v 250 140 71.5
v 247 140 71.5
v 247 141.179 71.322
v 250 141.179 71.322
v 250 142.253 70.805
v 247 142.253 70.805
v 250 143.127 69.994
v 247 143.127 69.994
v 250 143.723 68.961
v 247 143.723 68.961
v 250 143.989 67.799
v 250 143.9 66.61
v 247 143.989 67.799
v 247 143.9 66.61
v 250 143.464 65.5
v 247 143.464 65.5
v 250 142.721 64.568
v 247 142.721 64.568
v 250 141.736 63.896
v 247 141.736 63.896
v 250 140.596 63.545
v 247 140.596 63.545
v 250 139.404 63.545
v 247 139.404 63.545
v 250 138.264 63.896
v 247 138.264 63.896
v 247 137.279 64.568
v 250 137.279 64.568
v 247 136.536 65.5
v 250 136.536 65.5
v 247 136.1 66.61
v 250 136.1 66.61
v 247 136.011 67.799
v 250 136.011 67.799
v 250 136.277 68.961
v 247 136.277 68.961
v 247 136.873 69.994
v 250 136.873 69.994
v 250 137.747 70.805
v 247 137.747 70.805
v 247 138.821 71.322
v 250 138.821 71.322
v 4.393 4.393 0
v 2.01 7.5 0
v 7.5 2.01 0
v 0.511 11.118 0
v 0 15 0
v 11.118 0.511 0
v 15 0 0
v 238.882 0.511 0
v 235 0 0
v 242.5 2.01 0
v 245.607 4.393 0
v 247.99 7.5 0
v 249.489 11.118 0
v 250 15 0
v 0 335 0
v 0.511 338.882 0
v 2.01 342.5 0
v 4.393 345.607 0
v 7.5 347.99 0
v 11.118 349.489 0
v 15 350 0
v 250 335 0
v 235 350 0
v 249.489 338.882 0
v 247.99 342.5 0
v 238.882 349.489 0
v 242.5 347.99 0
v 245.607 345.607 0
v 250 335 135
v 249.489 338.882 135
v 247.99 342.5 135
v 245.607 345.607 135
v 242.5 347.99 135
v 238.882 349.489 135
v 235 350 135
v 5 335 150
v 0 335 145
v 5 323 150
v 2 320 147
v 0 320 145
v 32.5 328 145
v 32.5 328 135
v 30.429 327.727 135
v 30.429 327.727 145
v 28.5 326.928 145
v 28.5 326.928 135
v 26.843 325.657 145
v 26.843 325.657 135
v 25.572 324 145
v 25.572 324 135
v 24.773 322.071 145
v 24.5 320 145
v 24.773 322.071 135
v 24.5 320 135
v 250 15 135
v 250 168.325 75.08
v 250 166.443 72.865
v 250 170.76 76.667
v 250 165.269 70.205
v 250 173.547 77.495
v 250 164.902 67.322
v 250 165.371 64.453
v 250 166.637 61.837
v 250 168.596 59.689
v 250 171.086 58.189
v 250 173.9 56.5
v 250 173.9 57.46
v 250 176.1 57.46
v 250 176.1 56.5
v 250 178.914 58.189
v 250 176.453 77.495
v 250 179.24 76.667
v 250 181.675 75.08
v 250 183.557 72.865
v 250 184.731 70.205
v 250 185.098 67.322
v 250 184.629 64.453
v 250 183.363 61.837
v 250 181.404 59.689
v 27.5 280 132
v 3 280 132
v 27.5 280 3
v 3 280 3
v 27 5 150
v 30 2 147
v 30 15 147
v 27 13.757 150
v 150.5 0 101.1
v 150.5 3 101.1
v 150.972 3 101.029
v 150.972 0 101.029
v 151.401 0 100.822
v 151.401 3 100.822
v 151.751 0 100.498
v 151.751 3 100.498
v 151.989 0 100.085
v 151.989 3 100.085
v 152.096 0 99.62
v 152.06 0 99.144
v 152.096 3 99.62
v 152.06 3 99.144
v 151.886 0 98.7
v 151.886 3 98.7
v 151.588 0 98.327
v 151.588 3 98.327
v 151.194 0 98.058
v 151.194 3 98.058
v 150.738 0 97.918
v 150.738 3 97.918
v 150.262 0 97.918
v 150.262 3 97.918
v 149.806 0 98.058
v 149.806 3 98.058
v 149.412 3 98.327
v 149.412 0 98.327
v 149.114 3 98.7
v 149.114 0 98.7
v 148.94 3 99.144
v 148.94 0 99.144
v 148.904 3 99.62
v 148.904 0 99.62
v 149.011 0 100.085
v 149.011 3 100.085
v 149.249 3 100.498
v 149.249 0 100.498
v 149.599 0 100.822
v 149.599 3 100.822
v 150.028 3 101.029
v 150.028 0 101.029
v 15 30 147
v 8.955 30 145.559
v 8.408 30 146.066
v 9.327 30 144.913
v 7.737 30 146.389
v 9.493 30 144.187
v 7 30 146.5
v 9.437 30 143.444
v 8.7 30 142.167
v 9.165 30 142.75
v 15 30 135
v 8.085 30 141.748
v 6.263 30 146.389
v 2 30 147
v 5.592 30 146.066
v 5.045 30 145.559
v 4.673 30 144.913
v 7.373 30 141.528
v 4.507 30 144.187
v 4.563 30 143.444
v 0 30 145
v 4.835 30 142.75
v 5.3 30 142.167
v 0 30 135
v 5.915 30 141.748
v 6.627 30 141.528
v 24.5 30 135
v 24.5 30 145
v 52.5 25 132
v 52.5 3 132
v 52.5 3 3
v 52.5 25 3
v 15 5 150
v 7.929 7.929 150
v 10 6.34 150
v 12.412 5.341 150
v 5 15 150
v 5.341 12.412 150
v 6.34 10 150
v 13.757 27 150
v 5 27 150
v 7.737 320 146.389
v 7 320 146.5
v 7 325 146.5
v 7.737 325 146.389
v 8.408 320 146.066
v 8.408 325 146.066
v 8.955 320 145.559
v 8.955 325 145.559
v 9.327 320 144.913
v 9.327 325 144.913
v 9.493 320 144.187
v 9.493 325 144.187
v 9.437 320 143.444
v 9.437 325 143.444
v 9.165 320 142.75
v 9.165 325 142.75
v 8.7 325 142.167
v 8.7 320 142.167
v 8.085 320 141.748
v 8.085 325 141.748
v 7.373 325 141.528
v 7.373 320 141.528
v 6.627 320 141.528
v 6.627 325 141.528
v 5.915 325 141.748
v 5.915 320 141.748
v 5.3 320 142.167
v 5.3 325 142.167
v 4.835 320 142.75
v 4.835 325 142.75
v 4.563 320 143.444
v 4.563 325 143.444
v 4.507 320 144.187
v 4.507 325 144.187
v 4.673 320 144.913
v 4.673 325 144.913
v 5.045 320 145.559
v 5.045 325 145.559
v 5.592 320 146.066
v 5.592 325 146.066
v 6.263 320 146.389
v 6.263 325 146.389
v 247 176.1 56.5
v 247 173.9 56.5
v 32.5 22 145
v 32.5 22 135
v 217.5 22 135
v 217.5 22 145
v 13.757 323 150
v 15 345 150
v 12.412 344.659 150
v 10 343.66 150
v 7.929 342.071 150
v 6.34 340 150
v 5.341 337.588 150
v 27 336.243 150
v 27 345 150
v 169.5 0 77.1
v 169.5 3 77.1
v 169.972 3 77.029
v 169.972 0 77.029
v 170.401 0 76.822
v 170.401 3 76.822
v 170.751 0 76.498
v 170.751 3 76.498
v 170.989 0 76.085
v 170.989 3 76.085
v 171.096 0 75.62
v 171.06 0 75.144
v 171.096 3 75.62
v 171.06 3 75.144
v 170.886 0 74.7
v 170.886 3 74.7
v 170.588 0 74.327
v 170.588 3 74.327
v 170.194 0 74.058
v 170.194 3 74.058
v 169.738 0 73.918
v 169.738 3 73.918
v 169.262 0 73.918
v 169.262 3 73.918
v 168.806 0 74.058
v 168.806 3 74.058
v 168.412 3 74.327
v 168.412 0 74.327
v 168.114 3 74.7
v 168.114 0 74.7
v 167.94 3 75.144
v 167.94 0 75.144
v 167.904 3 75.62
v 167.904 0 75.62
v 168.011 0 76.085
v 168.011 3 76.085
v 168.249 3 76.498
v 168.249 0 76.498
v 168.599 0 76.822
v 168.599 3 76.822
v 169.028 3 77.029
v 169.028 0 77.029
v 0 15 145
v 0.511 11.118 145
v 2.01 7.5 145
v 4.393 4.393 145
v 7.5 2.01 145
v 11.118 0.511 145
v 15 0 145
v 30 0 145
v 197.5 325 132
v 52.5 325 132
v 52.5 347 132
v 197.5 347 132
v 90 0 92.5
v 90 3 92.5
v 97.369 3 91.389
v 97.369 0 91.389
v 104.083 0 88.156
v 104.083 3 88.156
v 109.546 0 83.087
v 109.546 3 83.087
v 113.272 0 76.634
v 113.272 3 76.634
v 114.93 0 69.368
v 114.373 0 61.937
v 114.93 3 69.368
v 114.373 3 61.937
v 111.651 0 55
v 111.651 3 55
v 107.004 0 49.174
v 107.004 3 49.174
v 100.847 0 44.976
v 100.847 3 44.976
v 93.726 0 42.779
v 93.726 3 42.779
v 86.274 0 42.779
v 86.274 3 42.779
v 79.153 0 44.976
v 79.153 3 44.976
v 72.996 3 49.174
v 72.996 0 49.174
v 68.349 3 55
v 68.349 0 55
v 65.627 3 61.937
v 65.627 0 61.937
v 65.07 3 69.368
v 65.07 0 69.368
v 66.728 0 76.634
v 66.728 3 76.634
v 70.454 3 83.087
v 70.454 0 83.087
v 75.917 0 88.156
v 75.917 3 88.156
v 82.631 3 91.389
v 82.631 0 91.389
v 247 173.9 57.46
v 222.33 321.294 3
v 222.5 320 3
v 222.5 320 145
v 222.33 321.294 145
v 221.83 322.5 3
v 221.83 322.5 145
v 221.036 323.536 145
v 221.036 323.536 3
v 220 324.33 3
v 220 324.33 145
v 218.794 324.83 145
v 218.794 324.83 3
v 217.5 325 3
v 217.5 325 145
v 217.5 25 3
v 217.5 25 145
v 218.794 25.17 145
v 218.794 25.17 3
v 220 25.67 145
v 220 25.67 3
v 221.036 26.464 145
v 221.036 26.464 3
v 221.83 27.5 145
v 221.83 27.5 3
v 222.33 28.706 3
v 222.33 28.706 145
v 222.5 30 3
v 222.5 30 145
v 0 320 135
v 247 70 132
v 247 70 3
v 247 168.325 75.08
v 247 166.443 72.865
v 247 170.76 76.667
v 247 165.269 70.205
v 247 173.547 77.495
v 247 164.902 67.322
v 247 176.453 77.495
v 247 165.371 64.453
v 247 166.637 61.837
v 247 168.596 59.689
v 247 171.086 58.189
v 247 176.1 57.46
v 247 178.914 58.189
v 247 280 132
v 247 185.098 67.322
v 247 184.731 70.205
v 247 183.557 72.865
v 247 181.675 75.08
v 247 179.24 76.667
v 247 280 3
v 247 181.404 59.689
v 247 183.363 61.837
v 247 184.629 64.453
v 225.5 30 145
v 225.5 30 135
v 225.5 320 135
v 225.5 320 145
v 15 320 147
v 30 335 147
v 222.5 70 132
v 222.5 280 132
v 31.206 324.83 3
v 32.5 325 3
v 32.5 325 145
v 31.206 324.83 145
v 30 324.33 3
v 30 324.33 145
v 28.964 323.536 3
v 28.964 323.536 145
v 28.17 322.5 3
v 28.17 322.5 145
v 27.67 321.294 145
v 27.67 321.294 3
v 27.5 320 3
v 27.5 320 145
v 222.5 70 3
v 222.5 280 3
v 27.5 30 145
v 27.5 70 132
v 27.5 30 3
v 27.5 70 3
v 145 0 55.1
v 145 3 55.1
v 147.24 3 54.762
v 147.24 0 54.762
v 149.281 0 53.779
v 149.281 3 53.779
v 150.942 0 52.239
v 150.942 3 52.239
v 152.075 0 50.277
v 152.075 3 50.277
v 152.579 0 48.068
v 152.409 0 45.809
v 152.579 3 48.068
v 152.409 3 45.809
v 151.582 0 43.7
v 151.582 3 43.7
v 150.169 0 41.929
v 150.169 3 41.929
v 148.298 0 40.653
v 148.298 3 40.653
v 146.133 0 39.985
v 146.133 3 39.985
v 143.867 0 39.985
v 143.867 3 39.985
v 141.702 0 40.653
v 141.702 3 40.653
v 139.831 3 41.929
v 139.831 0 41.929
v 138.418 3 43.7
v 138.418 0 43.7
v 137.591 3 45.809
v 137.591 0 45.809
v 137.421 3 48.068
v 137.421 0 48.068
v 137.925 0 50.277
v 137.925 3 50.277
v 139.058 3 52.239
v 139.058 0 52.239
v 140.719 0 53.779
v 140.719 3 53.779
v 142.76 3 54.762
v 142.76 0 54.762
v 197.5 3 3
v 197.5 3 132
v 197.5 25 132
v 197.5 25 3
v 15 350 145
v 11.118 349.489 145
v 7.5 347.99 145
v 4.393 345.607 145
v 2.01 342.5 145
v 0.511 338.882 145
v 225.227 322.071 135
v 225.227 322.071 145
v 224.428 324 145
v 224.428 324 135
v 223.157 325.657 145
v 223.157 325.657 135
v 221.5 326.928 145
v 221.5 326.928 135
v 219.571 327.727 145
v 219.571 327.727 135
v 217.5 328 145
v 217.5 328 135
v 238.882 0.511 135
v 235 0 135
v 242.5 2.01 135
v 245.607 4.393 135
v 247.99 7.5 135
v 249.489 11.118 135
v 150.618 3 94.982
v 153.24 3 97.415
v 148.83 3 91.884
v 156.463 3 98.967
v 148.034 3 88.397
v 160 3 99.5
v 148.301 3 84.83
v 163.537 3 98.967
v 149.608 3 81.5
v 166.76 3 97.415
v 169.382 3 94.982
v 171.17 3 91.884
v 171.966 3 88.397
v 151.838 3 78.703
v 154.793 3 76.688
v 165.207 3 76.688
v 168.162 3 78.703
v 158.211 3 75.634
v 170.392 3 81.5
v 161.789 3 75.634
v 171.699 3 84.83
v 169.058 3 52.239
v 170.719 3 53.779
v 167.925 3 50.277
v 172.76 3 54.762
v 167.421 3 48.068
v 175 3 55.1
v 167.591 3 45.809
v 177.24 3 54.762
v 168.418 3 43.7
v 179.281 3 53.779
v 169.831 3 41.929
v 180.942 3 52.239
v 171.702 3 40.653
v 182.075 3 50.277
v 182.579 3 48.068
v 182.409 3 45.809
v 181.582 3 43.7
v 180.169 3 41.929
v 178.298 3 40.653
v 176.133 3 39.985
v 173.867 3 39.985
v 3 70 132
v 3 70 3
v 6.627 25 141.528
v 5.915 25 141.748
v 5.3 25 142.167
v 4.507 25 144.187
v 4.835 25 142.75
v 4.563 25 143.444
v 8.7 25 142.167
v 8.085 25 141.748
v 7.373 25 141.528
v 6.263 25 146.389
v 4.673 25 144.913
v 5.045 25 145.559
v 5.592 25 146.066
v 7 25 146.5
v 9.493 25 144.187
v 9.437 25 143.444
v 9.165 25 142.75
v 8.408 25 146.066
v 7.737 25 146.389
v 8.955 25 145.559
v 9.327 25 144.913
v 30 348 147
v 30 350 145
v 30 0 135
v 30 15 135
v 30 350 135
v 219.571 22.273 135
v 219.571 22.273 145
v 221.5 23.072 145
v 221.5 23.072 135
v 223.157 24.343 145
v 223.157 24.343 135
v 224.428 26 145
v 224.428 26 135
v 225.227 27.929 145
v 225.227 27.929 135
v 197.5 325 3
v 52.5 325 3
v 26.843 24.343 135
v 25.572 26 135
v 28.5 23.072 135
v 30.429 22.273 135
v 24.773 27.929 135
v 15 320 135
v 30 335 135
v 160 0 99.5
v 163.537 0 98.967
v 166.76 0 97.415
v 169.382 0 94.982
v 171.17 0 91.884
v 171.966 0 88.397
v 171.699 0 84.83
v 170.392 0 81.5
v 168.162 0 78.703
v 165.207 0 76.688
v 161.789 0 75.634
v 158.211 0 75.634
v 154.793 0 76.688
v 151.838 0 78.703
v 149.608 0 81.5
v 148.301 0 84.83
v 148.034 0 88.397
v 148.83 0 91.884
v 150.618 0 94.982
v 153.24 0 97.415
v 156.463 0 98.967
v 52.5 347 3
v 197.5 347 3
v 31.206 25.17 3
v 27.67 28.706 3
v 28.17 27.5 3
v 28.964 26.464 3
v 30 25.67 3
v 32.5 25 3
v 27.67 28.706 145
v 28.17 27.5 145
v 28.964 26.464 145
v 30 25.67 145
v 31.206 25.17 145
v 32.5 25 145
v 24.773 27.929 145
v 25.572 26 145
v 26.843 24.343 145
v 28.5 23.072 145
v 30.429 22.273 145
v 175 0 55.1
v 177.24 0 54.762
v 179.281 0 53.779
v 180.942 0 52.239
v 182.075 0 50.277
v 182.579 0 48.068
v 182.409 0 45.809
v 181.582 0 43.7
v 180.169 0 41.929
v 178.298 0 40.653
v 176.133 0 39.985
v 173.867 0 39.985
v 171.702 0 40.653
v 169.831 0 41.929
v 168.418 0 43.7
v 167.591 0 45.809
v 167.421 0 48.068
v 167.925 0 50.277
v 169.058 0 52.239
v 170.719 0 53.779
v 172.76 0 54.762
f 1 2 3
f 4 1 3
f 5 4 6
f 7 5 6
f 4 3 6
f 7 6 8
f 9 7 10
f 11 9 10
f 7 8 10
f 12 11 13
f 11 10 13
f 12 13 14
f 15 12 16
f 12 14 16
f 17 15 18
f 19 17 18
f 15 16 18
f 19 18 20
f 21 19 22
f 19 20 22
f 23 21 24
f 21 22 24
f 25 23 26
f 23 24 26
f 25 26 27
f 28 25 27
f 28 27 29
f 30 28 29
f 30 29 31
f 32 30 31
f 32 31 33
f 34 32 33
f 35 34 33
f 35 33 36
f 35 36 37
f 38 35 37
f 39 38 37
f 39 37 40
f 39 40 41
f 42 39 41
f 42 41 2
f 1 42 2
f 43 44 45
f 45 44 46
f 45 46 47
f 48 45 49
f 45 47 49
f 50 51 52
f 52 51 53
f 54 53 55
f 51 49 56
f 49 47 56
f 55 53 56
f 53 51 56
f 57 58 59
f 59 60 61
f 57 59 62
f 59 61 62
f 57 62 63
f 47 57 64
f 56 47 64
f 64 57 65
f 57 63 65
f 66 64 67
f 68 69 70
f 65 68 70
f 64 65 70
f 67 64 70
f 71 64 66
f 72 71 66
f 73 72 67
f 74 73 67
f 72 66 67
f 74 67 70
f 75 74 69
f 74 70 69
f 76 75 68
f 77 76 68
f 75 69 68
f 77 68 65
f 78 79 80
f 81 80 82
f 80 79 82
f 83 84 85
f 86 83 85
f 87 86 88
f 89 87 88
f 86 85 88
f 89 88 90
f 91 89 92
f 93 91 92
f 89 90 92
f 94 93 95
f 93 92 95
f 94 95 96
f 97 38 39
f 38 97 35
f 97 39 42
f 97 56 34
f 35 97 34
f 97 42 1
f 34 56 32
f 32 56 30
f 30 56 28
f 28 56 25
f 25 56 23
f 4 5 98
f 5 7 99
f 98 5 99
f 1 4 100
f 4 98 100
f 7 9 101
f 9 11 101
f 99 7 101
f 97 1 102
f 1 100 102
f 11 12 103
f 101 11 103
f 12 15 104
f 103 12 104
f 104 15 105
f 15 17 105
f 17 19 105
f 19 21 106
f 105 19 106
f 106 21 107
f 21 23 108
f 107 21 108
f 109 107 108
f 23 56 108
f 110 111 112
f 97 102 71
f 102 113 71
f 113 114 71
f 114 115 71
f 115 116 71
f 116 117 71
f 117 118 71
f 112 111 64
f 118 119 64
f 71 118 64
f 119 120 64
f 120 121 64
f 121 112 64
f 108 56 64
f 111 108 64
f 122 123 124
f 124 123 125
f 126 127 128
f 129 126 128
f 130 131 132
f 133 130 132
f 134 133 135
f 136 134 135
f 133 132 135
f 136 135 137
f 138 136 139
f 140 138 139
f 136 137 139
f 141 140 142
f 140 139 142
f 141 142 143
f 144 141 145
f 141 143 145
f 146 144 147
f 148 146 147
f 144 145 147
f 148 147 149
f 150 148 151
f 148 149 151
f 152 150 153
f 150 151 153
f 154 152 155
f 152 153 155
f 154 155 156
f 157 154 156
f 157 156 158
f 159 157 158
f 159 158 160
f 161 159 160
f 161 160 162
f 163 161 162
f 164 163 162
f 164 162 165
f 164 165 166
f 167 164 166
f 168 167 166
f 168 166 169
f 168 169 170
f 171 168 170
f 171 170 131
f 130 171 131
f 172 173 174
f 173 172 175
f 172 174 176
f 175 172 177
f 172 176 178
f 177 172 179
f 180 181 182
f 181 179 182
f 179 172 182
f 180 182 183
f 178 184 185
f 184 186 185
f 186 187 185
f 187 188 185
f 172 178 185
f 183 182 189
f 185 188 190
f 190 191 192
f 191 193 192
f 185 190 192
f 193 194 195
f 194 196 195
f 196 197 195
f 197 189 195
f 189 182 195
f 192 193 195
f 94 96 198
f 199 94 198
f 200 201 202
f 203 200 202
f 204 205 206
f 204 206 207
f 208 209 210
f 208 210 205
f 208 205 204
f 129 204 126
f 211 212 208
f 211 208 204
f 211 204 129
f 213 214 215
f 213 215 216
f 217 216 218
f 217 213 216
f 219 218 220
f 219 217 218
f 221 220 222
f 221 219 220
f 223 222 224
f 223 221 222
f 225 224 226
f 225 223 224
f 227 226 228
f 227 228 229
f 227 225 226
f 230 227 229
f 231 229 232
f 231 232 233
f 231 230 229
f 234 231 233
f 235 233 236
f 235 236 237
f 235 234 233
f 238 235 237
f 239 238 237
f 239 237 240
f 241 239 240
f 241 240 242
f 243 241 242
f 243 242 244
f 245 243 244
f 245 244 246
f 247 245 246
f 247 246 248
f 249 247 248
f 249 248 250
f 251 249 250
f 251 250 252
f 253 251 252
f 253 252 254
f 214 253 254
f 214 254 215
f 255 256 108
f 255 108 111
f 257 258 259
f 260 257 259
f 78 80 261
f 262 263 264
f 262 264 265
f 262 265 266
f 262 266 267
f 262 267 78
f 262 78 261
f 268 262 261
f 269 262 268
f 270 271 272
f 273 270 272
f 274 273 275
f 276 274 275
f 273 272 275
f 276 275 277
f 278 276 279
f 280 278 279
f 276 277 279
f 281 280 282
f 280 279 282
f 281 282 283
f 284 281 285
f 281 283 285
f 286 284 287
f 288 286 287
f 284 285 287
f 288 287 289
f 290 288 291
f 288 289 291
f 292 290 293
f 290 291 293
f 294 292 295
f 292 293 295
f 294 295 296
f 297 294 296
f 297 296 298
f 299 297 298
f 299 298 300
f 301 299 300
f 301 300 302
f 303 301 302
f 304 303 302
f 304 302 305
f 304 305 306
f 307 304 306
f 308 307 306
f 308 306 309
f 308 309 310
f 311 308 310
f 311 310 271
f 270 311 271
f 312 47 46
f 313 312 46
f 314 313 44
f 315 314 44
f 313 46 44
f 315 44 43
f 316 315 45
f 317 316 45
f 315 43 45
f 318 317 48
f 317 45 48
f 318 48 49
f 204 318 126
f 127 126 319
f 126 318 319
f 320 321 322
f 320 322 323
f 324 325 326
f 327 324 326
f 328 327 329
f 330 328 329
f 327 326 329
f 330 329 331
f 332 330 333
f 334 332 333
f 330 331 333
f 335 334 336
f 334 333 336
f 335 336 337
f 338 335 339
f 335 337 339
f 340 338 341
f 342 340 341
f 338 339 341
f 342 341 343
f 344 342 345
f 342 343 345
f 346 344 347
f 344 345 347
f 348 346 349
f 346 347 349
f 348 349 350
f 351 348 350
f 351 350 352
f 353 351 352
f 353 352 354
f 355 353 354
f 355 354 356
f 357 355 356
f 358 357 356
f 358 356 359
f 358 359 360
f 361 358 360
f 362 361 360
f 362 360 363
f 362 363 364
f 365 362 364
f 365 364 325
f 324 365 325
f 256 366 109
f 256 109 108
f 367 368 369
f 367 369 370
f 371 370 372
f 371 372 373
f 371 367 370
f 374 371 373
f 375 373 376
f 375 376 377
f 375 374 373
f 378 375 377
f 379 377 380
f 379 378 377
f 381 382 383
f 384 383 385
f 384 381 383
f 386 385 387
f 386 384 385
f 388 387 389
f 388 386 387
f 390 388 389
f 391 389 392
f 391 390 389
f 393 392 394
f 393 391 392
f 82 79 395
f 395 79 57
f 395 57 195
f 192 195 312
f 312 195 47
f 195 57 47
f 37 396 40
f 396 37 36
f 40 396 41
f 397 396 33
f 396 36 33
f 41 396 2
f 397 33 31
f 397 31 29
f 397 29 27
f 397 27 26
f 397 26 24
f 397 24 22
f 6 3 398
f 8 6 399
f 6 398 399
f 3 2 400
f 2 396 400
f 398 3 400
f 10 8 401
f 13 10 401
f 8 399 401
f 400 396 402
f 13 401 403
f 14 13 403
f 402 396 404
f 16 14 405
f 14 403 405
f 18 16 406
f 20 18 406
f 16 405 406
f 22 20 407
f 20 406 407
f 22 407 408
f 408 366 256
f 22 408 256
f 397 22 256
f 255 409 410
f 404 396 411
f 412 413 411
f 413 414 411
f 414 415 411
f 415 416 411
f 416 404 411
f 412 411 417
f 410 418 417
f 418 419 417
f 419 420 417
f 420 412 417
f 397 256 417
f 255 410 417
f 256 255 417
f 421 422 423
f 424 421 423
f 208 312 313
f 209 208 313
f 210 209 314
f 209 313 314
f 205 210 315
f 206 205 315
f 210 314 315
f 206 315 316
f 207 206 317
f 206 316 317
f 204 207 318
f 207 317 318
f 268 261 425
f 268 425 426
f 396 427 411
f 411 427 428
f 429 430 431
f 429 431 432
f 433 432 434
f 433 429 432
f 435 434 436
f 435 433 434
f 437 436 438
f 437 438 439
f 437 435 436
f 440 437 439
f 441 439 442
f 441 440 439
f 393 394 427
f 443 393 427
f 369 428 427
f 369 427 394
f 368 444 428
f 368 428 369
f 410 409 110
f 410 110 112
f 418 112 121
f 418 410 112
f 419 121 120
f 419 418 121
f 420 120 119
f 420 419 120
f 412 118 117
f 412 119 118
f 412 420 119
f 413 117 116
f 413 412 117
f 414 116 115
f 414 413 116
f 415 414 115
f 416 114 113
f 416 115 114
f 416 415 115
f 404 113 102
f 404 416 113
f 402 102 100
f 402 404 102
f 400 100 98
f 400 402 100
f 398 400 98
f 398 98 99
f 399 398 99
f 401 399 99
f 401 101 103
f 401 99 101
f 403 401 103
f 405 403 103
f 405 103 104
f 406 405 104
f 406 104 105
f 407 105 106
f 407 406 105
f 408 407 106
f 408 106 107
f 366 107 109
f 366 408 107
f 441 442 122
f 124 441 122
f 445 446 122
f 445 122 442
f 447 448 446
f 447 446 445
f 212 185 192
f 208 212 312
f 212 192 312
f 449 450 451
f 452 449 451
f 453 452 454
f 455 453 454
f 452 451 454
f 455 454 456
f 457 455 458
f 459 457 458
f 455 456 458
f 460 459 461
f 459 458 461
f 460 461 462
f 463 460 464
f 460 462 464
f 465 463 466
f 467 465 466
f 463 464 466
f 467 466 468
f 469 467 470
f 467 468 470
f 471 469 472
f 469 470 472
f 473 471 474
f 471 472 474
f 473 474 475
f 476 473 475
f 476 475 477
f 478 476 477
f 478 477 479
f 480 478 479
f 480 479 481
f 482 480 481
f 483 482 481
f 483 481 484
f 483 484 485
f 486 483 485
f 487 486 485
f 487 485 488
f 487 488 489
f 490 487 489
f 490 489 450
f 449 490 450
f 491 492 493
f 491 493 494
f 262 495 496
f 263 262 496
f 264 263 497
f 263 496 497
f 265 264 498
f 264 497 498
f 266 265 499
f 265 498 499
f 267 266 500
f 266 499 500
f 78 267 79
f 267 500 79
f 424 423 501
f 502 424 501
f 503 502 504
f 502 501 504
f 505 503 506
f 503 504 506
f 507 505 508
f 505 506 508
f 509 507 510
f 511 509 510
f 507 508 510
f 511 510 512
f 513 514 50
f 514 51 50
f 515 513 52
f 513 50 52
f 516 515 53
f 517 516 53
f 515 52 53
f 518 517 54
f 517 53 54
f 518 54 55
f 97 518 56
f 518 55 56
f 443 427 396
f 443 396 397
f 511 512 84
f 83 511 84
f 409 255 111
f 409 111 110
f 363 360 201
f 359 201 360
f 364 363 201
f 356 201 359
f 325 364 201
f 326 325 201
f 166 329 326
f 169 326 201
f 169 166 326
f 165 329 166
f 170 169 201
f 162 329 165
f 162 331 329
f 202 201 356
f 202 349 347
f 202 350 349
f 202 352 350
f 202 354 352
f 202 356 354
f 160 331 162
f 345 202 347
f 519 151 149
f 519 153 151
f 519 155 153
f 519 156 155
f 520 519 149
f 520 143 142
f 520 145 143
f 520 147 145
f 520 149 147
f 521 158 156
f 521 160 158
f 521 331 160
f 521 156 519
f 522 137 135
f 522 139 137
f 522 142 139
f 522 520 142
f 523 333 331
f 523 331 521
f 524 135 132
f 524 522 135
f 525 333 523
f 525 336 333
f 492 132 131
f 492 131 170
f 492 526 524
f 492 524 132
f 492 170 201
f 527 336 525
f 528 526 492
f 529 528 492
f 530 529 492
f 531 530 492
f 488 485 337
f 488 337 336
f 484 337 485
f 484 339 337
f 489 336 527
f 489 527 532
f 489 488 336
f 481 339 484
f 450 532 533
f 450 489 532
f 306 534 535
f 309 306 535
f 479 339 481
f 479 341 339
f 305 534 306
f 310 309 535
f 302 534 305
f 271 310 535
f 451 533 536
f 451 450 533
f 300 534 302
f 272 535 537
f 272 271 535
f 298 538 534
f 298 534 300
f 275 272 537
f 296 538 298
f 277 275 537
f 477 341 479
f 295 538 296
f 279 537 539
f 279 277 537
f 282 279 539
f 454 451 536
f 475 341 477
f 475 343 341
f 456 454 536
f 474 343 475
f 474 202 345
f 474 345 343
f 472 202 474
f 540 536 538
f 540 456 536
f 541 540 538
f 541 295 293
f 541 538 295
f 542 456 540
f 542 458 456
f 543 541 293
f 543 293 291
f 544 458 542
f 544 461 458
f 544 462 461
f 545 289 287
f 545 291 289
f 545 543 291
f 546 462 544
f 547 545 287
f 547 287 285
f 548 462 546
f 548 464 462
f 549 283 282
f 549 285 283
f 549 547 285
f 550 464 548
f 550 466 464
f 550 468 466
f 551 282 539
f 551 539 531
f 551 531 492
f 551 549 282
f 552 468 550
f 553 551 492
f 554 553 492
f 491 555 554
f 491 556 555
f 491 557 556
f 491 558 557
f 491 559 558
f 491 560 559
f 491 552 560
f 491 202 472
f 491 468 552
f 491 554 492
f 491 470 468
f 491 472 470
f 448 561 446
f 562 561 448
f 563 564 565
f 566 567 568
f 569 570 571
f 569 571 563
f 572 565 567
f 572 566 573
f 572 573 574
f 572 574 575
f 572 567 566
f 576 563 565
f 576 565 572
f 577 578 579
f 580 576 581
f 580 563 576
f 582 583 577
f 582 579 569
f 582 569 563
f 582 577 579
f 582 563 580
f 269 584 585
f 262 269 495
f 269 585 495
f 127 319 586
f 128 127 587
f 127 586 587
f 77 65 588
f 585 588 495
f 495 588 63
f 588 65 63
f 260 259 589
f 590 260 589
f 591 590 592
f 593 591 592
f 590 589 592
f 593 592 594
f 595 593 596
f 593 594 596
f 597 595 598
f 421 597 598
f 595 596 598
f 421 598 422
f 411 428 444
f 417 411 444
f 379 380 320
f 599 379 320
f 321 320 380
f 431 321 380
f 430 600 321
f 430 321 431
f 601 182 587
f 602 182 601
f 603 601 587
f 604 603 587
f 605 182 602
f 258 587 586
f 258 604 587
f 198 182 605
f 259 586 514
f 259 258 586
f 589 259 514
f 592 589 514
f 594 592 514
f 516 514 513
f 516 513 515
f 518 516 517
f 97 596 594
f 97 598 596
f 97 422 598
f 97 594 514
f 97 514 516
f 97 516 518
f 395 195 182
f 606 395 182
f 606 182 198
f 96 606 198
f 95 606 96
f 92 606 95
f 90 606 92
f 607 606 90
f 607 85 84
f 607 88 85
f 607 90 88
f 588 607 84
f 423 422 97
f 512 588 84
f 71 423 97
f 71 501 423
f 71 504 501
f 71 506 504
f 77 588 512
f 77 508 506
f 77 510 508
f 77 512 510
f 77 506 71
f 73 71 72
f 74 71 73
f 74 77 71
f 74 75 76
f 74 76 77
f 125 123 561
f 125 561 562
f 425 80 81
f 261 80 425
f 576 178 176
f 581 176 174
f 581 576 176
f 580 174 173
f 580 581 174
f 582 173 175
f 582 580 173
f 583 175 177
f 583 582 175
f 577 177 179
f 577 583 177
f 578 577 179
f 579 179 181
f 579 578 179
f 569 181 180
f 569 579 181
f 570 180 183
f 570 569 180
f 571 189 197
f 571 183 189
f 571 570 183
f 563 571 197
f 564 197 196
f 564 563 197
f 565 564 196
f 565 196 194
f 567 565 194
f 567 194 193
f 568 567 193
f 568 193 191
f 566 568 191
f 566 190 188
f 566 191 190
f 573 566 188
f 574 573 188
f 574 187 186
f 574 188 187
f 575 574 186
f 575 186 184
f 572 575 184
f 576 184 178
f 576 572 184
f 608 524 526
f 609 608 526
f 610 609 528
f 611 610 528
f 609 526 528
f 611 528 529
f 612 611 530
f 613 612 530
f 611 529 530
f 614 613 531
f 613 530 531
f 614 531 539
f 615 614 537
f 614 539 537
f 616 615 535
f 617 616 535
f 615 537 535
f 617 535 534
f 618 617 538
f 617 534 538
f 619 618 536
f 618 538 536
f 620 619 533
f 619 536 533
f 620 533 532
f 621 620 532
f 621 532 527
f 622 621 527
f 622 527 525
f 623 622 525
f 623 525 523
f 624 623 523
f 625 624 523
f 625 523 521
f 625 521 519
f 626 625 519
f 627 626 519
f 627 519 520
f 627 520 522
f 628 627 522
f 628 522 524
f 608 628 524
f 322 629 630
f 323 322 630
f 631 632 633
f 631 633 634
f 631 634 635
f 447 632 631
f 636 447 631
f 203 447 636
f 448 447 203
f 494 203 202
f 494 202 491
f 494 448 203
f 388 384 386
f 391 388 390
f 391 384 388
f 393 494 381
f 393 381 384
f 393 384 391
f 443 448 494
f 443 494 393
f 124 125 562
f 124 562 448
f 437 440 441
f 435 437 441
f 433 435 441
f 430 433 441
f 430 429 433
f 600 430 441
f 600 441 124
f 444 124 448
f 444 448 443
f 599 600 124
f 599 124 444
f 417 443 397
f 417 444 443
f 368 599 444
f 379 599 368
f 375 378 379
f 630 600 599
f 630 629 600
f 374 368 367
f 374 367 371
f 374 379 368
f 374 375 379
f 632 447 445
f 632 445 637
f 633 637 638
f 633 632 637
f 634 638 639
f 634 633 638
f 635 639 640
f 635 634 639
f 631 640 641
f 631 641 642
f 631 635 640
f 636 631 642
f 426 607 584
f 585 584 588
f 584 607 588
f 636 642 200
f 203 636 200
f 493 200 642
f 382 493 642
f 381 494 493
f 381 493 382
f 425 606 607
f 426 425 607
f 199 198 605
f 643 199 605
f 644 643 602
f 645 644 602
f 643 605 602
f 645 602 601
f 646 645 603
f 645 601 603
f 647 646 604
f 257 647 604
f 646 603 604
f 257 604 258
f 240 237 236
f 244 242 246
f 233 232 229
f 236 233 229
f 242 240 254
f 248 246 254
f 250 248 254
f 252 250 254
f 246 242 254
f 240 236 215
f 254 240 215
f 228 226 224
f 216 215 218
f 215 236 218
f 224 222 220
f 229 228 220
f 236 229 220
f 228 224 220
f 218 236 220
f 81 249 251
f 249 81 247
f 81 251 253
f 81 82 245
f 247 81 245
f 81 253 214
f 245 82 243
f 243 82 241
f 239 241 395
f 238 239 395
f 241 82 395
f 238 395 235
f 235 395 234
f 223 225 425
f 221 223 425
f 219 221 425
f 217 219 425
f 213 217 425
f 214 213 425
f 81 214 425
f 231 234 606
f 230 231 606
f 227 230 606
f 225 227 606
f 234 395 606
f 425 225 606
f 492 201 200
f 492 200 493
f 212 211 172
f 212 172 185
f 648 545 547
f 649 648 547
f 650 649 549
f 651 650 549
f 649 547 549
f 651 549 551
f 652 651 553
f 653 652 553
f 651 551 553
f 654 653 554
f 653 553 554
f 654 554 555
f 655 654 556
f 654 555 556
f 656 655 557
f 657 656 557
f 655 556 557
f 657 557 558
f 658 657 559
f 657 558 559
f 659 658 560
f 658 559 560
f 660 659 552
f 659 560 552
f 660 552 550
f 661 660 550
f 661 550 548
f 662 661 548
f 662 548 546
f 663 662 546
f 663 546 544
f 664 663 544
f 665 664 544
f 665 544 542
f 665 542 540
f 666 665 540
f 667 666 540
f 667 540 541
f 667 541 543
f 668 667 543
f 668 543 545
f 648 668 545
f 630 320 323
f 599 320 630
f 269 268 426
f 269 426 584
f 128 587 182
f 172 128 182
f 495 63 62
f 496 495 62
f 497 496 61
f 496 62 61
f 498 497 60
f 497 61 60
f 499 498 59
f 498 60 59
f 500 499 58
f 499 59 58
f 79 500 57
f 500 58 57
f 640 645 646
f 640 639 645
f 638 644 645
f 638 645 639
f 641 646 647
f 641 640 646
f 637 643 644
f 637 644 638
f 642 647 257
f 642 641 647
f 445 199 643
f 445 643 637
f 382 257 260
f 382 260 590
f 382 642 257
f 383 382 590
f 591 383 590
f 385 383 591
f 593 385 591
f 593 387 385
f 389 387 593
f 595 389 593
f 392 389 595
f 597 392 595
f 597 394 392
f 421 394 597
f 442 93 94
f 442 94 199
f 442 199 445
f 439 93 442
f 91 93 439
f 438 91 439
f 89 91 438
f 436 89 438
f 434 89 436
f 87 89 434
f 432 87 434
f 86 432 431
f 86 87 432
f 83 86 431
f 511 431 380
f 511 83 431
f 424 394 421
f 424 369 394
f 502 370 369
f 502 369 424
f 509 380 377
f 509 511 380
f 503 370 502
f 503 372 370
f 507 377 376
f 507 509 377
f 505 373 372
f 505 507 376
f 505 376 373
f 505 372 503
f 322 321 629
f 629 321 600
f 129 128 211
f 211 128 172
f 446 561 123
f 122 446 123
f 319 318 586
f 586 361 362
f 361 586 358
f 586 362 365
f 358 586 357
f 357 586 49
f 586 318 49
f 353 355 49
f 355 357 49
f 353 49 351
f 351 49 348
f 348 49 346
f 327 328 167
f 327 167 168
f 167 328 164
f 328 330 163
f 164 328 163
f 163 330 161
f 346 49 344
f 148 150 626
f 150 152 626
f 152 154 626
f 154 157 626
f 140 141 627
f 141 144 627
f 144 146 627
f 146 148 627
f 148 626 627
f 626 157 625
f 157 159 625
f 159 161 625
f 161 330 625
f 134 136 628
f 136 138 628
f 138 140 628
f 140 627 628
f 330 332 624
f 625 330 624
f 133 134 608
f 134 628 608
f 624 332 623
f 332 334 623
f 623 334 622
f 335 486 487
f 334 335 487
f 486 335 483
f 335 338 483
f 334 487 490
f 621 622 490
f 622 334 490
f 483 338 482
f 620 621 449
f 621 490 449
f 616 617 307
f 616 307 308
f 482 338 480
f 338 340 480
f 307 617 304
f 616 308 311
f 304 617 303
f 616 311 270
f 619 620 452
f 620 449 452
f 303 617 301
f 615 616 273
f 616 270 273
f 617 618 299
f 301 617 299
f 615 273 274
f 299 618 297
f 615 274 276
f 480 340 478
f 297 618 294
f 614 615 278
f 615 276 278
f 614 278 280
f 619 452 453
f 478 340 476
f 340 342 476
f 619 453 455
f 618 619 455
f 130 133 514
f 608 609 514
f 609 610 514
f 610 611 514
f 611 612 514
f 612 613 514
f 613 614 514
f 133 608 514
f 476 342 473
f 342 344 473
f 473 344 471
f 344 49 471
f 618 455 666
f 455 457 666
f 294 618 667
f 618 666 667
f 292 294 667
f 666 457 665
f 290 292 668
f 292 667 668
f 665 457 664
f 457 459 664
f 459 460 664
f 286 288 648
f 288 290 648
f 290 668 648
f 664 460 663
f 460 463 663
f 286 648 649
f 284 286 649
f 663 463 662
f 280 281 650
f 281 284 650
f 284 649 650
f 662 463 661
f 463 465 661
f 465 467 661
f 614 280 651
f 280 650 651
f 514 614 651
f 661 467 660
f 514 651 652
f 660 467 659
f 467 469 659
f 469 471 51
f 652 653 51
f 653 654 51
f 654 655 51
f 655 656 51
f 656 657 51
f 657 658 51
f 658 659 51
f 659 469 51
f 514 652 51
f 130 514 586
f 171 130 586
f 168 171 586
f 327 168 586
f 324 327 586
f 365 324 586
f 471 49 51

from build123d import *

# Parameters (mm, degrees)
BOSS_EXTRUDE1_DEPTH     = 3
BOSS_EXTRUDE2_DEPTH     = 132
CUT_EXTRUDE1_DEPTH      = 219.5
CUT_EXTRUDE1_DEPTH_BACK = 24.5
SKETCH3_W               = 129
SKETCH3_H               = 210
CUT_EXTRUDE2_DEPTH      = 322
CUT_EXTRUDE2_DEPTH_BACK = 22
SKETCH5_W               = 145
SKETCH5_H               = 129
BOSS_EXTRUDE3_DEPTH     = 10
BOSS_EXTRUDE4_DEPTH     = 15
CHAMFER1_SIZE           = 5
CHAMFER2_SIZE           = 3
CUT_EXTRUDE3_DEPTH      = 295
CUT_EXTRUDE3_DEPTH_BACK = 5
SKETCH10_R              = 2.5
SKETCH11_R              = 12
SKETCH11_R_2            = 7.6
SKETCH11_R_3            = 25
SKETCH11_R_4            = 1.6
CUT_EXTRUDE4_DEPTH      = 10
SKETCH13_R              = 4
CUT_EXTRUDE6_DEPTH      = 10


with BuildPart() as part:
    # Sketch1 → Boss-Extrude1 (new body)
    with BuildSketch(Plane.XY):
        with BuildLine():
            Line((15, 0), (235, 0))
            ThreePointArc((235, 0), (245.606601718, 4.393398282), (250, 15))
            Line((250, 15), (250, 335))
            ThreePointArc((250, 335), (245.606601718, 345.606601718), (235, 350))
            Line((235, 350), (15, 350))
            ThreePointArc((15, 350), (4.393398282, 345.606601718), (0, 335))
            Line((0, 335), (0, 15))
            ThreePointArc((0, 15), (4.393398282, 4.393398282), (15, 0))
        make_face()
    extrude(amount=BOSS_EXTRUDE1_DEPTH)

    # Sketch2 → Boss-Extrude2 (add)
    with BuildSketch(Plane.XY.offset(3)):
        with BuildLine():
            Line((0, 335), (0, 15))
            ThreePointArc((0, 15), (4.393398282, 4.393398282), (15, 0))
            Line((15, 0), (235, 0))
            ThreePointArc((235, 0), (245.606601718, 4.393398282), (250, 15))
            Line((250, 15), (250, 335))
            ThreePointArc((250, 335), (245.606601718, 345.606601718), (235, 350))
            Line((235, 350), (15, 350))
            ThreePointArc((15, 350), (4.393398282, 345.606601718), (0, 335))
        make_face()
        with BuildLine():
            ThreePointArc((32.5, 325), (28.964466094, 323.535533906), (27.5, 320))
            Line((27.5, 320), (27.5, 30))
            ThreePointArc((27.5, 30), (28.964466094, 26.464466094), (32.5, 25))
            Line((32.5, 25), (217.5, 25))
            ThreePointArc((217.5, 25), (221.035533906, 26.464466094), (222.5, 30))
            Line((222.5, 30), (222.5, 320))
            ThreePointArc((222.5, 320), (221.035533906, 323.535533906), (217.5, 325))
            Line((217.5, 325), (32.5, 325))
        make_face(mode=Mode.SUBTRACT)
    extrude(amount=BOSS_EXTRUDE2_DEPTH)

    # Sketch3 → Cut-Extrude1 (cut, two sides: drawn at the far end of the back side and taken through both)
    with BuildSketch(Plane(origin=(27.5, 0, 0), x_dir=(0, 0, -1), z_dir=(1, 0, 0)).offset(-CUT_EXTRUDE1_DEPTH_BACK)):
        with Locations((-67.5, 175)):
            Rectangle(SKETCH3_W, SKETCH3_H)
    extrude(amount=CUT_EXTRUDE1_DEPTH + CUT_EXTRUDE1_DEPTH_BACK, mode=Mode.SUBTRACT)

    # Sketch5 → Cut-Extrude2 (cut, two sides: drawn at the far end of the back side and taken through both)
    with BuildSketch(Plane(origin=(0, 25, 0), x_dir=(1, 0, 0), z_dir=(0, 1, 0)).offset(-CUT_EXTRUDE2_DEPTH_BACK)):
        with Locations((125, -67.5)):
            Rectangle(SKETCH5_W, SKETCH5_H)
    extrude(amount=CUT_EXTRUDE2_DEPTH + CUT_EXTRUDE2_DEPTH_BACK, mode=Mode.SUBTRACT)

    # Sketch8 → Boss-Extrude3 (add)
    with BuildSketch(Plane.XY.offset(135)):
        with BuildLine():
            Line((225.5, 30), (225.5, 320))
            ThreePointArc((225.5, 320), (223.156854249, 325.656854249), (217.5, 328))
            Line((217.5, 328), (32.5, 328))
            ThreePointArc((32.5, 328), (26.843145751, 325.656854249), (24.5, 320))
            Line((24.5, 320), (24.5, 30))
            ThreePointArc((24.5, 30), (26.843145751, 24.343145751), (32.5, 22))
            Line((32.5, 22), (217.5, 22))
            ThreePointArc((217.5, 22), (223.156854249, 24.343145751), (225.5, 30))
        make_face()
        with BuildLine():
            Line((32.5, 25), (217.5, 25))
            ThreePointArc((217.5, 25), (221.035533906, 26.464466094), (222.5, 30))
            Line((222.5, 30), (222.5, 320))
            ThreePointArc((222.5, 320), (221.035533906, 323.535533906), (217.5, 325))
            Line((217.5, 325), (32.5, 325))
            ThreePointArc((32.5, 325), (28.964466094, 323.535533906), (27.5, 320))
            Line((27.5, 320), (27.5, 30))
            ThreePointArc((27.5, 30), (28.964466094, 26.464466094), (32.5, 25))
        make_face(mode=Mode.SUBTRACT)
    extrude(amount=BOSS_EXTRUDE3_DEPTH)

    # Sketch9 → Boss-Extrude4 (add)
    with BuildSketch(Plane.XY.offset(135)):
        with BuildLine():
            ThreePointArc((0, 15), (4.393398282, 4.393398282), (15, 0))
            Line((15, 0), (30, 0))
            Line((30, 0), (30, 15))
            Line((30, 15), (15, 30))
            Line((15, 30), (0, 30))
            Line((0, 30), (0, 15))
        make_face()
        with BuildLine():
            Line((0, 335), (0, 320))
            Line((0, 320), (15, 320))
            Line((15, 320), (30, 335))
            Line((30, 335), (30, 350))
            Line((30, 350), (15, 350))
            ThreePointArc((15, 350), (4.393398282, 345.606601718), (0, 335))
        make_face()
    extrude(amount=BOSS_EXTRUDE4_DEPTH)

    # Chamfer1
    chamfer1_edges = [part.edges().sort_by_distance(p)[0] for p in [
        (0, 22.5, 150),
        (4.393398282, 4.393398282, 150),
        (22.5, 0, 150),
        (22.5, 350, 150),
        (4.393398282, 345.606601718, 150),
        (0, 327.5, 150),
    ]]
    chamfer(chamfer1_edges, length=CHAMFER1_SIZE)

    # Chamfer2
    chamfer2_edges = [part.edges().sort_by_distance(p)[0] for p in [
        (30, 10, 150),
        (22.5, 22.5, 150),
        (22.5, 327.5, 150),
        (30, 340, 150),
        (10, 30, 150),
        (10, 320, 150),
    ]]
    chamfer(chamfer2_edges, length=CHAMFER2_SIZE)

    # Sketch10 → Cut-Extrude3 (cut, two sides: drawn at the far end of the back side and taken through both)
    with BuildSketch(Plane(origin=(0, 30, 0), x_dir=(1, 0, 0), z_dir=(0, 1, 0)).offset(-CUT_EXTRUDE3_DEPTH_BACK)):
        with Locations(Location((7, -144, 0), (0, 0, 270))):
            Circle(SKETCH10_R)
    extrude(amount=CUT_EXTRUDE3_DEPTH + CUT_EXTRUDE3_DEPTH_BACK, mode=Mode.SUBTRACT)

    # Sketch11 → Cut-Extrude4 (cut)
    with BuildSketch(Plane(origin=(0, 3, 0), x_dir=(1, 0, 0), z_dir=(0, 1, 0))):
        with Locations(Location((160, -87.5, 0), (0, 0, 270))):
            Circle(SKETCH11_R)
        with Locations(Location((145, -47.5, 0), (0, 0, 270))):
            Circle(SKETCH11_R_2)
        with Locations(Location((175, -47.5, 0), (0, 0, 270))):
            Circle(SKETCH11_R_2)
        with Locations(Location((90, -67.5, 0), (0, 0, 270))):
            Circle(SKETCH11_R_3)
        with Locations(Location((150.5, -99.5, 0), (0, 0, 270))):
            Circle(SKETCH11_R_4)
        with Locations(Location((169.5, -75.5, 0), (0, 0, 270))):
            Circle(SKETCH11_R_4)
    extrude(amount=-CUT_EXTRUDE4_DEPTH, mode=Mode.SUBTRACT)

    # Sketch13 → Cut-Extrude6 (cut)
    with BuildSketch(Plane.ZY.offset(-247)):
        with Locations((67.5, 140)):
            Circle(SKETCH13_R)
        with BuildLine():
            Line((57.460079682, 173.9), (56.5, 173.9))
            Line((56.5, 173.9), (56.5, 176.1))
            Line((56.5, 176.1), (57.460079682, 176.1))
            ThreePointArc((57.460079682, 176.1), (77.6, 175), (57.460079682, 173.9))
        make_face()
    extrude(amount=-CUT_EXTRUDE6_DEPTH, mode=Mode.SUBTRACT)


solid = part.part
